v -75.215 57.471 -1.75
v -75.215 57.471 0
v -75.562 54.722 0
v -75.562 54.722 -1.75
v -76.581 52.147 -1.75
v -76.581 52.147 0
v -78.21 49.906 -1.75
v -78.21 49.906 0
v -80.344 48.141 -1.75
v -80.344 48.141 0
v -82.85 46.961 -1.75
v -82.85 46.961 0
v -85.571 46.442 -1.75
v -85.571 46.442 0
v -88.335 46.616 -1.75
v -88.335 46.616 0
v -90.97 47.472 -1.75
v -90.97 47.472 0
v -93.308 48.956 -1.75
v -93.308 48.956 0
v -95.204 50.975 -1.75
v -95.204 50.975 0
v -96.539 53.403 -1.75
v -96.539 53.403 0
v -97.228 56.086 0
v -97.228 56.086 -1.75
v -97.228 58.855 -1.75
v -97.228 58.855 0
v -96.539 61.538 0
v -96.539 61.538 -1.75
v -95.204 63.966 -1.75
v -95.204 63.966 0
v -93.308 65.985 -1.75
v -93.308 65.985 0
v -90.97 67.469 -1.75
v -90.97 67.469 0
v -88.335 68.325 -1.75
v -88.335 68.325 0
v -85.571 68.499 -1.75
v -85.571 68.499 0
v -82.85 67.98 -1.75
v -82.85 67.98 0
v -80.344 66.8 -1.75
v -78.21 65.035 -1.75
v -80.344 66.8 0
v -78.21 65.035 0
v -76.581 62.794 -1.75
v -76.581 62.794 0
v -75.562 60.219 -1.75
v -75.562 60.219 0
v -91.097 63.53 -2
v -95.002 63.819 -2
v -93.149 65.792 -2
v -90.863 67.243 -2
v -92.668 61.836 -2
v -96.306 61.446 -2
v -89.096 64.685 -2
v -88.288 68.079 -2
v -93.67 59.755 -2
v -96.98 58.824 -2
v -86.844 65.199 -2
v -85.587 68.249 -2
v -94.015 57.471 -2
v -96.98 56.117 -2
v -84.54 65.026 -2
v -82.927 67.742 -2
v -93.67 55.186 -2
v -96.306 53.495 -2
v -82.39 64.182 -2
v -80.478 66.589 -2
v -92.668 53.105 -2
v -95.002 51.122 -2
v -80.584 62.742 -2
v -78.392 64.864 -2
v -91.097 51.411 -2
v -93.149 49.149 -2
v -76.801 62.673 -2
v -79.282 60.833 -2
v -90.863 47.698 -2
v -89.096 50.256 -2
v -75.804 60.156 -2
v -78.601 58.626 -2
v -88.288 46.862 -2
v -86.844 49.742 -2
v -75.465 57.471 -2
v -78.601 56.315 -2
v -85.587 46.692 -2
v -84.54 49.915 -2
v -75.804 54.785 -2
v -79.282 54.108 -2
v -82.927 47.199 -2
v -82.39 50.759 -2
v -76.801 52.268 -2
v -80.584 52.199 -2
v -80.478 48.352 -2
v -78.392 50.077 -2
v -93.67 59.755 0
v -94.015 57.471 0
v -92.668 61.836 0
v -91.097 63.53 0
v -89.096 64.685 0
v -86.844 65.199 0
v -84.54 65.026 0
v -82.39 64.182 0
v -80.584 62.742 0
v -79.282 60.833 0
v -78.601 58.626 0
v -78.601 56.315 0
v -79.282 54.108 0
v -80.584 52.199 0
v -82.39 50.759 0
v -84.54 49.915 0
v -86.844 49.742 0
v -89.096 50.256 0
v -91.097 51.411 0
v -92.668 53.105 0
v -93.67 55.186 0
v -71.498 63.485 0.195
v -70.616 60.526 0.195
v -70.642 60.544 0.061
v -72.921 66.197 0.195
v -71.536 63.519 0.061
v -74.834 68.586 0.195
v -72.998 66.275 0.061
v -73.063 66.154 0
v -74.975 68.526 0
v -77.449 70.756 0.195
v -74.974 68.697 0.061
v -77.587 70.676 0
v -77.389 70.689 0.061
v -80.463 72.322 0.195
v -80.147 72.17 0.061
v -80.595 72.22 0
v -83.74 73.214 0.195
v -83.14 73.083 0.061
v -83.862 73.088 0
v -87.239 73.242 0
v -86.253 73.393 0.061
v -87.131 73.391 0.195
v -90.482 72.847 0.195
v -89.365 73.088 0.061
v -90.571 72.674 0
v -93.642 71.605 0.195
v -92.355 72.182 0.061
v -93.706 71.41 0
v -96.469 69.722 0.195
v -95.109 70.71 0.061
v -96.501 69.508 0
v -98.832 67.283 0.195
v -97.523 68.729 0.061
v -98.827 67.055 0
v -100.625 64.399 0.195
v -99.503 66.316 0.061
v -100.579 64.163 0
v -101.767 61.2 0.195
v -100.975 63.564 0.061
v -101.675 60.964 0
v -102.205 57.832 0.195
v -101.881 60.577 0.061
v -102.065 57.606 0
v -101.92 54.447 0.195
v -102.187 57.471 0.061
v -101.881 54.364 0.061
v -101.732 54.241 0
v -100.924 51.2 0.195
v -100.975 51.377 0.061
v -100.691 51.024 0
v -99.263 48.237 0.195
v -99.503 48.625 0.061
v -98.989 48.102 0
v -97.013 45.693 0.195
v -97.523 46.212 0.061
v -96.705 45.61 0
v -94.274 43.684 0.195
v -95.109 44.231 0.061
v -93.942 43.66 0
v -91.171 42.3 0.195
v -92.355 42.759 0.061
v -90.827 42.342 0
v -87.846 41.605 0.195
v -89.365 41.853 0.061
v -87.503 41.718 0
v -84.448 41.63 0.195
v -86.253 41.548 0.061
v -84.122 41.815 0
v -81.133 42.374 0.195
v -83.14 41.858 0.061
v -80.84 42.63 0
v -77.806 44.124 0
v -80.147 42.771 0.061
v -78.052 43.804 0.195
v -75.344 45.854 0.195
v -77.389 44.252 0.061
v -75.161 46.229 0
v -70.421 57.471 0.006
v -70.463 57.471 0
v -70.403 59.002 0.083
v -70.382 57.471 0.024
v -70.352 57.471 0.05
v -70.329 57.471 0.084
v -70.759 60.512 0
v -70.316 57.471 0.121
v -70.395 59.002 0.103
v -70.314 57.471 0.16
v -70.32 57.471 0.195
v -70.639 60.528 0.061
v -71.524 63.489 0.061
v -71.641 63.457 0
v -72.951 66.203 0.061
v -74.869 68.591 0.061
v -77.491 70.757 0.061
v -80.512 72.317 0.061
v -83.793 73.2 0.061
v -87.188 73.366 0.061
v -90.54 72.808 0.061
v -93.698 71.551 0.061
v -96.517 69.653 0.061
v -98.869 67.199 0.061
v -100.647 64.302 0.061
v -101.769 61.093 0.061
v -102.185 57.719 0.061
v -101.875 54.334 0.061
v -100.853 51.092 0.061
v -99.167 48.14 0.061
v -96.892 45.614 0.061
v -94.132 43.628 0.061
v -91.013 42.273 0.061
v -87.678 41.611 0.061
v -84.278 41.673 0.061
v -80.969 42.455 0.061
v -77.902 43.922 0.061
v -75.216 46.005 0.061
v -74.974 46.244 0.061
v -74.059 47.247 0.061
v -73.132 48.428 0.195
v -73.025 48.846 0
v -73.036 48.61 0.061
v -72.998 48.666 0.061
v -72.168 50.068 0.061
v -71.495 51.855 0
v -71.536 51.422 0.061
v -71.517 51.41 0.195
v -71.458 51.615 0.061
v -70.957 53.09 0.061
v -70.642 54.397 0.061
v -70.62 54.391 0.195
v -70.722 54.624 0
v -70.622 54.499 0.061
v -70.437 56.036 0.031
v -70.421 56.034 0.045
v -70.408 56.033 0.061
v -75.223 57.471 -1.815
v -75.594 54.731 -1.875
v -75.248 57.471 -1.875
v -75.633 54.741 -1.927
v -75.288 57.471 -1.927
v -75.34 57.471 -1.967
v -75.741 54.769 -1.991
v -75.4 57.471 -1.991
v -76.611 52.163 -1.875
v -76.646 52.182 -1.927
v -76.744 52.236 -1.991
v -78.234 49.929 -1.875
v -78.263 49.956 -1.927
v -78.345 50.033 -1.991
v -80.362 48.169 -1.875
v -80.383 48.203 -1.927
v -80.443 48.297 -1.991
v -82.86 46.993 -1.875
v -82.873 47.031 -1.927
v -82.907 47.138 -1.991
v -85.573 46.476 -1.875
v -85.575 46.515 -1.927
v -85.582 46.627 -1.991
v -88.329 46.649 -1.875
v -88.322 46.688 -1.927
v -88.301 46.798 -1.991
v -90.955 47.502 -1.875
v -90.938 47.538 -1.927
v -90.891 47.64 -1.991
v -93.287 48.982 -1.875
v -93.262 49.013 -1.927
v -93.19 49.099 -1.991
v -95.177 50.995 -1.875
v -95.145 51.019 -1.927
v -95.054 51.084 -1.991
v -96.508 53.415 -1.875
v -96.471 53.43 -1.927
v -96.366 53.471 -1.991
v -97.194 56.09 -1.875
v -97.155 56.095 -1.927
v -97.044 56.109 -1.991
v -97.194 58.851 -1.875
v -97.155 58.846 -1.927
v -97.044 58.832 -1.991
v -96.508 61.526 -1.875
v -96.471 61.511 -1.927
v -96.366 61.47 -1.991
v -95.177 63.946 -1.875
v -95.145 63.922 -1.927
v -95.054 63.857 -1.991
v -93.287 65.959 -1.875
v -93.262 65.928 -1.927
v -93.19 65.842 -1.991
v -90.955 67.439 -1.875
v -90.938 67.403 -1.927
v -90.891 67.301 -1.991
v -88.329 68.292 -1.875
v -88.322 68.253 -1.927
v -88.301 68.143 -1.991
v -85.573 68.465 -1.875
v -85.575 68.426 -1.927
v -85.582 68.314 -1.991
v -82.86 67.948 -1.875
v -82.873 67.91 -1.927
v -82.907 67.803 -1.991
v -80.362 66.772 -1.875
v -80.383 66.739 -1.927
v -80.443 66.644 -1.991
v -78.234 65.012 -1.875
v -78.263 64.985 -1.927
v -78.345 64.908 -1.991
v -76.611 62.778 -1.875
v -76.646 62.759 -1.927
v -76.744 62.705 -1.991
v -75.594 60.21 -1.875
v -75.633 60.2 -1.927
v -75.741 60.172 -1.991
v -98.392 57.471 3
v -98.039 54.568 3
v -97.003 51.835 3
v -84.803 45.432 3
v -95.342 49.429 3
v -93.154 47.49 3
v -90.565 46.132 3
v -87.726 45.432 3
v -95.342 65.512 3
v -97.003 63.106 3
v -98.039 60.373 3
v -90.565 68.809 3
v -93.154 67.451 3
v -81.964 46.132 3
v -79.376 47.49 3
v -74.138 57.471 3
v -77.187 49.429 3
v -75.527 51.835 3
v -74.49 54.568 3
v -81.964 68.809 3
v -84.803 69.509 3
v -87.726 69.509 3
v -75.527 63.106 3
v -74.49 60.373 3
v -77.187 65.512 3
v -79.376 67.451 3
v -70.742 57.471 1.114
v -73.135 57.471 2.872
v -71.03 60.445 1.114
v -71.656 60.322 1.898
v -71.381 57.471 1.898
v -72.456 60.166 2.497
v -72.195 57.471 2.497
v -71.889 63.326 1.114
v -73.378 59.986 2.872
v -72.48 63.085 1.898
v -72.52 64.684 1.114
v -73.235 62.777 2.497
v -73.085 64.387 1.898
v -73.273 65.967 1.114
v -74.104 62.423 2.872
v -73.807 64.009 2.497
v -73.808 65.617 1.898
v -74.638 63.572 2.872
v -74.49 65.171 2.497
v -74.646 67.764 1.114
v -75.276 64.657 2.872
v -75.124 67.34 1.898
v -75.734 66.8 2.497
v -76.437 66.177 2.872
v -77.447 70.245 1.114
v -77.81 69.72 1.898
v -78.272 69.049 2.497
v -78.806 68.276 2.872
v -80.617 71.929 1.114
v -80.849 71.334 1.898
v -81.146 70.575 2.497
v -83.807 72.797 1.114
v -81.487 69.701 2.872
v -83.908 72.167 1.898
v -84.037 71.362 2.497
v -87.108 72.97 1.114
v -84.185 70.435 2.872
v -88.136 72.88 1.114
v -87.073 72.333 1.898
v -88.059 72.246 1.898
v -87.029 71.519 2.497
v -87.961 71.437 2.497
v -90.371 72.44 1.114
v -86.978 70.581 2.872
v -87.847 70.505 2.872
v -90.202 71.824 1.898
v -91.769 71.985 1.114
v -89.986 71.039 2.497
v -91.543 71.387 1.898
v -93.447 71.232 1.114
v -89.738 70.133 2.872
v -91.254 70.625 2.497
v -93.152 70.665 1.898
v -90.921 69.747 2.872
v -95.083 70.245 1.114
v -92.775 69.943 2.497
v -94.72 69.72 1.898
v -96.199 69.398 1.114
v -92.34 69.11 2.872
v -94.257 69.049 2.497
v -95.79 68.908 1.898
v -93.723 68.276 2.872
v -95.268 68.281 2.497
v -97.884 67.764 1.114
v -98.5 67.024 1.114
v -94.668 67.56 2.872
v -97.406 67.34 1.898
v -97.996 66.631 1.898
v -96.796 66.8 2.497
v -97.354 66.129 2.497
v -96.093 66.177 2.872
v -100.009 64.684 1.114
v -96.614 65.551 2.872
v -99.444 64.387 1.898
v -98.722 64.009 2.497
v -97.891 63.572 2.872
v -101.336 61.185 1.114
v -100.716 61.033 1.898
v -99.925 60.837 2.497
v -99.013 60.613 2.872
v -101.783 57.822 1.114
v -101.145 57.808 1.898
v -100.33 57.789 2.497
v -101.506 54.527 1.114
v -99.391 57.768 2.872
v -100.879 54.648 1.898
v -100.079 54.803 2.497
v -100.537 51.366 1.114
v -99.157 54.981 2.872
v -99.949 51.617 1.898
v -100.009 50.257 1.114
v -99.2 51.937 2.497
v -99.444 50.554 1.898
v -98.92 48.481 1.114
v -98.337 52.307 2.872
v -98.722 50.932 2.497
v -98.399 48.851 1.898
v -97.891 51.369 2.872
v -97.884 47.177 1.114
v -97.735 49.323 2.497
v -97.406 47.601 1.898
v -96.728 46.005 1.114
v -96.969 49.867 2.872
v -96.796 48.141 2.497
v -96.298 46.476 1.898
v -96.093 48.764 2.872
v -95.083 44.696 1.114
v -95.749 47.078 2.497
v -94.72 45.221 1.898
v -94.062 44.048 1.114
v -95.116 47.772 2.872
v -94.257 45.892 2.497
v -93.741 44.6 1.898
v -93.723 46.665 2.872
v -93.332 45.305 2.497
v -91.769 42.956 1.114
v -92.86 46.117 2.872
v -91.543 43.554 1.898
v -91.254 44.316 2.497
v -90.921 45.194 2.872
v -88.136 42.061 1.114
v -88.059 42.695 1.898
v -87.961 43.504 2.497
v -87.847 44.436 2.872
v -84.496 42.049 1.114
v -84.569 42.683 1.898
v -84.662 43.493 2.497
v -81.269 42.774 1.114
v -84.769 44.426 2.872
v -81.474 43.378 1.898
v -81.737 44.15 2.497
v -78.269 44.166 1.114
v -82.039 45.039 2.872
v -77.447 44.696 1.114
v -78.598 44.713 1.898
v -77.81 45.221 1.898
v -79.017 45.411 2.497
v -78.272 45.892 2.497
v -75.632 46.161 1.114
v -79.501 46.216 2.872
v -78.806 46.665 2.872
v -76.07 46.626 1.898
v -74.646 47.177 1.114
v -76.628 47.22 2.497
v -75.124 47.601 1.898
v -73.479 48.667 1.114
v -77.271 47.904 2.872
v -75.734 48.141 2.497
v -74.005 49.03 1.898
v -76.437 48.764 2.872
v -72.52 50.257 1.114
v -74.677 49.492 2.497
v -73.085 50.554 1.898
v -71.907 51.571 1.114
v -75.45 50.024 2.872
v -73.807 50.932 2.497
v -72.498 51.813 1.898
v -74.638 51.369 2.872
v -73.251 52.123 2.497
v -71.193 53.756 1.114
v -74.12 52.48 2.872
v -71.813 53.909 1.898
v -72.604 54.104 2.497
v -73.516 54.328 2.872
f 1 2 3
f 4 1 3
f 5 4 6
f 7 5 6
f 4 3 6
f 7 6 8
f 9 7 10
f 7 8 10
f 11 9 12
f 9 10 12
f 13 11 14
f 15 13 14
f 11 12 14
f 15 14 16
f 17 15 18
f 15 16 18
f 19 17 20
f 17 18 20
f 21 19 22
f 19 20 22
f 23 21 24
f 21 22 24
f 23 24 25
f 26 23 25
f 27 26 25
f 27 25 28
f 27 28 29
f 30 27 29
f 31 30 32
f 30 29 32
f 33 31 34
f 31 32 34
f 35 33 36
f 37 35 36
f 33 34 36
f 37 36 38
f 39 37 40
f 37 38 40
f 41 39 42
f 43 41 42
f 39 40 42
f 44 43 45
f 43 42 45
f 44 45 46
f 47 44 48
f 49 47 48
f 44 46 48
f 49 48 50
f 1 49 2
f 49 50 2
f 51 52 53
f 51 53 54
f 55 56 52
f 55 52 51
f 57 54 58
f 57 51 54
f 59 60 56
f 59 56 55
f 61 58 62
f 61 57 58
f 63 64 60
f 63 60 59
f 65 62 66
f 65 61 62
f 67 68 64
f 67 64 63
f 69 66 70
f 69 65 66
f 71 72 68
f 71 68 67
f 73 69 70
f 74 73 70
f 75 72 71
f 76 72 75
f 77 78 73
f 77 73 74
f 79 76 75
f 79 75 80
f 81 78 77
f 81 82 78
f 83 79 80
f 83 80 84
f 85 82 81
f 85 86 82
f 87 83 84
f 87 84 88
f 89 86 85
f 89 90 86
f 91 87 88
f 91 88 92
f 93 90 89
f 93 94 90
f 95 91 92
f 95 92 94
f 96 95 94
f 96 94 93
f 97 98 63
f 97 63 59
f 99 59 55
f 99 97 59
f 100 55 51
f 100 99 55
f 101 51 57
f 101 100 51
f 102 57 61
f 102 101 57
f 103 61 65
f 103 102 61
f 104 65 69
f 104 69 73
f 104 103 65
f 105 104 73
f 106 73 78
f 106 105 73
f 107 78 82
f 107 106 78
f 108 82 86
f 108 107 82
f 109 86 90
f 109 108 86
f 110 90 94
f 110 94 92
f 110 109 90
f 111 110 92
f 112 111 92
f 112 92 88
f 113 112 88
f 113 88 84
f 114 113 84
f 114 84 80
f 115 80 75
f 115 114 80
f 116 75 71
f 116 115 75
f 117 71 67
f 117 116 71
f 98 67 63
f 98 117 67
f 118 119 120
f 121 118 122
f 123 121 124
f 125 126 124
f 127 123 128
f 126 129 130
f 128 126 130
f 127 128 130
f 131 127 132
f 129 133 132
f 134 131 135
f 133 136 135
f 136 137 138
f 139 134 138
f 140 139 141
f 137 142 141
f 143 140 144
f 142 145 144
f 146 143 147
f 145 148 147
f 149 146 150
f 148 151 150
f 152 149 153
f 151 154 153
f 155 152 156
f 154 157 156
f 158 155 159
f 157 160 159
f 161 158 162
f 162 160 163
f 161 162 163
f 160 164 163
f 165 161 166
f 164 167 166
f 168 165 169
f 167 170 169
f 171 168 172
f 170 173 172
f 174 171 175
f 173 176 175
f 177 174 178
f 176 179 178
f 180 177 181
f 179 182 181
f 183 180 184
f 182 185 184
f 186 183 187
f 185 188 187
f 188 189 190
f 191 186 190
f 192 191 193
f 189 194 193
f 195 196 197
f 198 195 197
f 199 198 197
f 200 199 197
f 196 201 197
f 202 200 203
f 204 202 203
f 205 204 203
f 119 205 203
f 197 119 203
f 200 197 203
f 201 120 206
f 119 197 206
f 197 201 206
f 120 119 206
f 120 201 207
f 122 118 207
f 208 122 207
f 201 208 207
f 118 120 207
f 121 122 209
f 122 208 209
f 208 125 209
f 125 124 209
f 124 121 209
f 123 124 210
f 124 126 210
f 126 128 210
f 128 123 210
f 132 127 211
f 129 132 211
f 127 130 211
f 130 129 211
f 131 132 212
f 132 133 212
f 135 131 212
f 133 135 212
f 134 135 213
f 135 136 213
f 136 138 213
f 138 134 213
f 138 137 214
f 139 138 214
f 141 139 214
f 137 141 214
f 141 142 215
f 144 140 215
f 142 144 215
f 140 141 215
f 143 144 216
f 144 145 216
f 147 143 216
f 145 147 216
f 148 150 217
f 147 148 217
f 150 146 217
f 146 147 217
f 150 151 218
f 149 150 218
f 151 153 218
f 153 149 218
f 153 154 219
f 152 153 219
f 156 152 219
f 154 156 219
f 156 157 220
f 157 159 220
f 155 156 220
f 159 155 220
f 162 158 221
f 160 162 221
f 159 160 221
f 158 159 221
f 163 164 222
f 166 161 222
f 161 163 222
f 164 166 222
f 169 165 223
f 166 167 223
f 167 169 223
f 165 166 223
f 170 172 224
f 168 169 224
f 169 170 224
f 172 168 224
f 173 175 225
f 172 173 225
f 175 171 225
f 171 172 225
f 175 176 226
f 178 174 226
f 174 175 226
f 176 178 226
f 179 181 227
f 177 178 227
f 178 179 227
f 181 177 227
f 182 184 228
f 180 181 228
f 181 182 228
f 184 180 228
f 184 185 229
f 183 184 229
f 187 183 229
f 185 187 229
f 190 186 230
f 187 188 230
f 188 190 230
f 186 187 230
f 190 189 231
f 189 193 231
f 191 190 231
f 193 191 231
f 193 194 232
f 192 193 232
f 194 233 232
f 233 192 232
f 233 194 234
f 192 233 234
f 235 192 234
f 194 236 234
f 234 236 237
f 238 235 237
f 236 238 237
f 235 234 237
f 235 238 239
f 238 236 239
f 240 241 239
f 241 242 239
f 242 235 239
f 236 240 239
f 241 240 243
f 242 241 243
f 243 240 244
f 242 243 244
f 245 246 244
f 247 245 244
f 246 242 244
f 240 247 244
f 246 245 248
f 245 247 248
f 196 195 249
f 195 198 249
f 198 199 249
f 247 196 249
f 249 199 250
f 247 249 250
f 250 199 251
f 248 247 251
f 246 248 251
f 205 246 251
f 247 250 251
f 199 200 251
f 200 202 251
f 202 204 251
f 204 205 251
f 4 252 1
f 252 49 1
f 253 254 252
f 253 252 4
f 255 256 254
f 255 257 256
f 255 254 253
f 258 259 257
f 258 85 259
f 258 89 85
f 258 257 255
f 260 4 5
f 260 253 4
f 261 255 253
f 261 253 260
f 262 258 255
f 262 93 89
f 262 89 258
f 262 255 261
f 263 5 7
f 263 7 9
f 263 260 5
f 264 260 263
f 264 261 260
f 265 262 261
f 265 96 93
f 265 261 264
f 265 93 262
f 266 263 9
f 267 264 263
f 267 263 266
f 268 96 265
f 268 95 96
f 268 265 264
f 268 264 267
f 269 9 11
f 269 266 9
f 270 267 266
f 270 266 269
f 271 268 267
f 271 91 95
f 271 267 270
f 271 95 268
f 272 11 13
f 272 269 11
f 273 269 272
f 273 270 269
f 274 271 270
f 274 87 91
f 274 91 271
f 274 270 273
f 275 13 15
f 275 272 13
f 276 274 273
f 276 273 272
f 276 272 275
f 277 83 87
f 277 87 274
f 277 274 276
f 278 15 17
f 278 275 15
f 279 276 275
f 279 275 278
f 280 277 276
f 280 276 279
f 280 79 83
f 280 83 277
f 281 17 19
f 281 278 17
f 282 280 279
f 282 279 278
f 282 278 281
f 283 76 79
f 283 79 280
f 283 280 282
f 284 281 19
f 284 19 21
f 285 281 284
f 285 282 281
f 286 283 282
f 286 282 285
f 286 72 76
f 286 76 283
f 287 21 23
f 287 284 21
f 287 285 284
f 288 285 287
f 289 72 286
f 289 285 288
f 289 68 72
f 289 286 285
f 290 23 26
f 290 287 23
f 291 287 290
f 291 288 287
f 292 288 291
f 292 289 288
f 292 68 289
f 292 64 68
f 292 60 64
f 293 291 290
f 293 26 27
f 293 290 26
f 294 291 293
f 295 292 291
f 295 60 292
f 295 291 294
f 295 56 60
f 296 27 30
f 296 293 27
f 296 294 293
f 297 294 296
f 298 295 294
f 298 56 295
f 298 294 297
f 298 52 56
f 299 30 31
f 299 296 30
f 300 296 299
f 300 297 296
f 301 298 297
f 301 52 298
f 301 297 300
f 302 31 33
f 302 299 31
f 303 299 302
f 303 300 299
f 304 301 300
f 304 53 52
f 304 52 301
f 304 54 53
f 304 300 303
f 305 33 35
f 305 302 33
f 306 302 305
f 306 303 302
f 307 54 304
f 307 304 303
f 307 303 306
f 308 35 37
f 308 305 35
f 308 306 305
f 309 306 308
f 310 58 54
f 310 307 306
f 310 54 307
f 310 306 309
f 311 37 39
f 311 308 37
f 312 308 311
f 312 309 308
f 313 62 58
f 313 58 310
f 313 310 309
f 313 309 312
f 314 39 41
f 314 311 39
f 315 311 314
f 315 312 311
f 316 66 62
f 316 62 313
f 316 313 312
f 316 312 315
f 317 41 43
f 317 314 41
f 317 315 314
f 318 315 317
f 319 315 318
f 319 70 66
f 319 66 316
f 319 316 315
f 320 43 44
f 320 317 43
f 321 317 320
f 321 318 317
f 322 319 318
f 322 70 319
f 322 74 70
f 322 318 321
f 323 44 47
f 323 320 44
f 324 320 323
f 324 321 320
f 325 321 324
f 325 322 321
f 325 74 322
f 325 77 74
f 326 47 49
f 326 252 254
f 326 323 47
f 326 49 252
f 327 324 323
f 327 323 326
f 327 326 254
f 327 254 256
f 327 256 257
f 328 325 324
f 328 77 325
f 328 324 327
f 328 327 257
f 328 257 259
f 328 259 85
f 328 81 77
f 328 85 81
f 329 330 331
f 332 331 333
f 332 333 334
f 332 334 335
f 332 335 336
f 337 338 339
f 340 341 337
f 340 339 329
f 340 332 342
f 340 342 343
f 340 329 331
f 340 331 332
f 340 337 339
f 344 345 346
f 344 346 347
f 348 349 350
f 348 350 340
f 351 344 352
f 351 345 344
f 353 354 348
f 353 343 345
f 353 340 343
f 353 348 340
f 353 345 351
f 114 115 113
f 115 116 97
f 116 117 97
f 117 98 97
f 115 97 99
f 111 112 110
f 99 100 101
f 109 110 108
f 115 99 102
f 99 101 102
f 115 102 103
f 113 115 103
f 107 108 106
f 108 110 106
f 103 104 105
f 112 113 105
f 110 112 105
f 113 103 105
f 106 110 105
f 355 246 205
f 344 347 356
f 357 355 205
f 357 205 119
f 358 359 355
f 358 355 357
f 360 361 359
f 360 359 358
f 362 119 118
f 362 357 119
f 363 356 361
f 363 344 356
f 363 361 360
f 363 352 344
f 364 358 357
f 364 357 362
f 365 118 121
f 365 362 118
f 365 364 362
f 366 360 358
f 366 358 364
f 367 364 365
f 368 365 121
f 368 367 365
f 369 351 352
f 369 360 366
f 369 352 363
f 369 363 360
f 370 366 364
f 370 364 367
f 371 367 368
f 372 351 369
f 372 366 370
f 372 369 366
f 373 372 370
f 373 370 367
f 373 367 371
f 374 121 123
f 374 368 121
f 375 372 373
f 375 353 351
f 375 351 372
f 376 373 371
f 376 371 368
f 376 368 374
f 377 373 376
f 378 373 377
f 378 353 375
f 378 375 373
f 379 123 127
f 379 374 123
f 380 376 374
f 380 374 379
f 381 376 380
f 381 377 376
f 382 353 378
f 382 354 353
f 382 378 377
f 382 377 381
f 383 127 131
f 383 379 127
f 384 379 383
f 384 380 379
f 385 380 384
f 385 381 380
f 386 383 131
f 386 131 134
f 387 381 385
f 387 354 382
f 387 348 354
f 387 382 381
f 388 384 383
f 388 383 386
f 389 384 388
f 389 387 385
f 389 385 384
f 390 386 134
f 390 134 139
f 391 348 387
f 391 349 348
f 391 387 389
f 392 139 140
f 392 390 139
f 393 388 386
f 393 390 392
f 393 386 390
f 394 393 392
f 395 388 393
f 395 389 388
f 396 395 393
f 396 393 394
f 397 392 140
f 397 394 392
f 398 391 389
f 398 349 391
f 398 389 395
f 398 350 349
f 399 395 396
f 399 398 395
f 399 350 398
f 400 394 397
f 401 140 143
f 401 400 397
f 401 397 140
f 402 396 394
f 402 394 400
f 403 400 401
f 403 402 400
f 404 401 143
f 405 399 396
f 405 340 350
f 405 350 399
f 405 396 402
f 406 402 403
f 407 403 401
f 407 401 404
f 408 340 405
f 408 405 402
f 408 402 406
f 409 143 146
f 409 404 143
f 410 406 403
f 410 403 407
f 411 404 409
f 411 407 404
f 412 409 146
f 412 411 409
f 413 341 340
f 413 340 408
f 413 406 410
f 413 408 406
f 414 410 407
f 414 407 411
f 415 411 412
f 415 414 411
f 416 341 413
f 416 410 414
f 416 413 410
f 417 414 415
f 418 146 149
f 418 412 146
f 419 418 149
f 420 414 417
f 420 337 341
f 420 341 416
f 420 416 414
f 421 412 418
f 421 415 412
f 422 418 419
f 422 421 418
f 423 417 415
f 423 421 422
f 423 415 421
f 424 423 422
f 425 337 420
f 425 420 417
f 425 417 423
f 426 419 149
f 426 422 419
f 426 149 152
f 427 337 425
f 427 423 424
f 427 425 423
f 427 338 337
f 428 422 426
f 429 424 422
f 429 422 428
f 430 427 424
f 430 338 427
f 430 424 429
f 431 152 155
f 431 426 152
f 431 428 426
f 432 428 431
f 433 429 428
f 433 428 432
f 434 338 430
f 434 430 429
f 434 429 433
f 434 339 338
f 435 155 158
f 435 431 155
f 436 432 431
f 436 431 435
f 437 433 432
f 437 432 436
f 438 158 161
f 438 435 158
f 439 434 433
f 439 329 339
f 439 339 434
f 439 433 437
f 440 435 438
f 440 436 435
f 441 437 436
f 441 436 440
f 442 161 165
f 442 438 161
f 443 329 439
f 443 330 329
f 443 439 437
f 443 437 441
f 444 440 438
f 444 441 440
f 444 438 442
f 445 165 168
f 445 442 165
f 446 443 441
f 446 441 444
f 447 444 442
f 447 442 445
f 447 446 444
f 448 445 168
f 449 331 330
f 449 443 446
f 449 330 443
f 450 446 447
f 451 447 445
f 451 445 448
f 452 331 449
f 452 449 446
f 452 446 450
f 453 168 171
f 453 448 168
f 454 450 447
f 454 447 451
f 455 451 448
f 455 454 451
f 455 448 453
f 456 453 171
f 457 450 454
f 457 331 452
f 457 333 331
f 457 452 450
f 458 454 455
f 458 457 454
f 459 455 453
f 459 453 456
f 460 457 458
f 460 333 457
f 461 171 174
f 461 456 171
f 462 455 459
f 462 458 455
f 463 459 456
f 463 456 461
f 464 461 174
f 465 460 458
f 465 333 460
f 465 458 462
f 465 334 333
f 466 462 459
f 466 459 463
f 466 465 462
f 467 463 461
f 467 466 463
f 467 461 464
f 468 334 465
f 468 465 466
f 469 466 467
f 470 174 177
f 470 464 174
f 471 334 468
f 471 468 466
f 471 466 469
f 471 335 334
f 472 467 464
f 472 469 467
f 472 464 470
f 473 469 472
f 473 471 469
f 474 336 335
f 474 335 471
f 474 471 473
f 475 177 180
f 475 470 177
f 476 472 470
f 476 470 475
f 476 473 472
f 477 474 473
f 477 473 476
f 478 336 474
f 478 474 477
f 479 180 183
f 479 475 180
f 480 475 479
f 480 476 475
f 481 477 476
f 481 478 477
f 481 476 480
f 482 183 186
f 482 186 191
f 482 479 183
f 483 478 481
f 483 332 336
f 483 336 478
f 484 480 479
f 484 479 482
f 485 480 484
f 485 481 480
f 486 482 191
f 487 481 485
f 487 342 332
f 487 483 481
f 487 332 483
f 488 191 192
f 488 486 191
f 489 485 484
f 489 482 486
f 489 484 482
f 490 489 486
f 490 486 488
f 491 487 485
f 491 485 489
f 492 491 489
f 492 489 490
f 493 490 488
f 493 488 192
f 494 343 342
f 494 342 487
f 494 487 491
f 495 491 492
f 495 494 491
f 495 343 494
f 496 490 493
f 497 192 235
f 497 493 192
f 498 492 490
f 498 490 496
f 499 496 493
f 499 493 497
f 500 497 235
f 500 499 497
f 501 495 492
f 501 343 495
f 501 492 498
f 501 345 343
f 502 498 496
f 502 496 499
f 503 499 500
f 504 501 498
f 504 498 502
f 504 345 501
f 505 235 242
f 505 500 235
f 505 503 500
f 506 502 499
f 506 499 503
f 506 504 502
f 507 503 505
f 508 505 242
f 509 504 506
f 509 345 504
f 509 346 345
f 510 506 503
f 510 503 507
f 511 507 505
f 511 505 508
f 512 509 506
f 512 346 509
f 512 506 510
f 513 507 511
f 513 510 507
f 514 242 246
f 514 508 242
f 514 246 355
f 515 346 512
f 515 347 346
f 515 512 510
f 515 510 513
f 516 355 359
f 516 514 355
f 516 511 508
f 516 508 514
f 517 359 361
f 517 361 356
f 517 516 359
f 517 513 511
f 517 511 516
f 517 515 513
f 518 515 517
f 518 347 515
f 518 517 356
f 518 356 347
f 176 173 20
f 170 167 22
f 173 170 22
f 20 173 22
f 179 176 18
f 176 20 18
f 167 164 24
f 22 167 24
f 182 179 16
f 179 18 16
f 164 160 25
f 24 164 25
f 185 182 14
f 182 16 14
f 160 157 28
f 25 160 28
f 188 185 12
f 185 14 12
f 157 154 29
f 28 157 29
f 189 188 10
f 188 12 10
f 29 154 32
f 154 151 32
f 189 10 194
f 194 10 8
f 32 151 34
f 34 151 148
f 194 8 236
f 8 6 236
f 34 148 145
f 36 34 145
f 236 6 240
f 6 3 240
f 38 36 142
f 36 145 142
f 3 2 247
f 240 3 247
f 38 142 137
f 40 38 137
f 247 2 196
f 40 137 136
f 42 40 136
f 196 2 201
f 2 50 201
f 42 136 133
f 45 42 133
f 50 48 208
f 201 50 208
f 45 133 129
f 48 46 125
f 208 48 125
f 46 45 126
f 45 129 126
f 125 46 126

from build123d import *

# Parameters (mm, degrees)
SKETCH1_R           = 16
BOSS_EXTRUDE1_DEPTH = 3
FILLET1_R           = 4
FILLET2_R           = 0.15
SKETCH2_R           = 11.05
SKETCH2_R_2         = 7.75
BOSS_EXTRUDE2_DEPTH = 2
FILLET3_R           = 0.25


with BuildPart() as part:
    # Sketch1 → Boss-Extrude1 (new body)
    with BuildSketch(Plane.XY):
        with Locations((-86.26466932, 57.470508952)):
            Circle(SKETCH1_R)
    extrude(amount=BOSS_EXTRUDE1_DEPTH)

    # Fillet1
    # the kernel refuses this fillet: 4 mm, written as the material it takes off along each edge
    with BuildSketch(Plane(origin=(-86.26466932, 57.470508952, 3), x_dir=(1, 0, 0), z_dir=(0, -1, 0))) as fillet1_piece_1:
        with BuildLine():
            CenterArc((12.127016654, -4), FILLET1_R, 14.477512186, 75.522487814)
            Line((12.127016654, 0), (12.127016654, 0.08))
            Line((12.127016654, 0.08), (16, 0.08))
            Line((16, 0.08), (16.08, 0))
            ThreePointArc((16.08, 0), (16.08, -1.5), (16.077459667, -2.98))
            Line((16.077459667, -2.98), (16, -3))
        make_face()
    revolve(axis=Axis((-86.26466932, 57.470508952, 3), (0, 0, 1)), mode=Mode.SUBTRACT)

    # Fillet2
    fillet2_edges = [part.edges().sort_by_distance(p)[0] for p in [
        (-102.26466932, 57.470508952, 0),
    ]]
    fillet(fillet2_edges, radius=FILLET2_R)

    # Sketch2 → Boss-Extrude2 (add)
    with BuildSketch(Plane(origin=(0, 0, 0), x_dir=(-1, 0, 0), z_dir=(0, 0, -1))):
        with Locations(Location((86.26466932, 57.470508952, 0), (0, 0, 180))):
            Circle(SKETCH2_R)
        with Locations((86.26466932, 57.470508952)):
            Circle(SKETCH2_R_2, mode=Mode.SUBTRACT)
    extrude(amount=BOSS_EXTRUDE2_DEPTH)

    # Fillet3
    fillet3_edges = [part.edges().sort_by_distance(p)[0] for p in [
        (-97.31466932, 57.470508952, -2),
    ]]
    fillet(fillet3_edges, radius=FILLET3_R)


solid = part.part
